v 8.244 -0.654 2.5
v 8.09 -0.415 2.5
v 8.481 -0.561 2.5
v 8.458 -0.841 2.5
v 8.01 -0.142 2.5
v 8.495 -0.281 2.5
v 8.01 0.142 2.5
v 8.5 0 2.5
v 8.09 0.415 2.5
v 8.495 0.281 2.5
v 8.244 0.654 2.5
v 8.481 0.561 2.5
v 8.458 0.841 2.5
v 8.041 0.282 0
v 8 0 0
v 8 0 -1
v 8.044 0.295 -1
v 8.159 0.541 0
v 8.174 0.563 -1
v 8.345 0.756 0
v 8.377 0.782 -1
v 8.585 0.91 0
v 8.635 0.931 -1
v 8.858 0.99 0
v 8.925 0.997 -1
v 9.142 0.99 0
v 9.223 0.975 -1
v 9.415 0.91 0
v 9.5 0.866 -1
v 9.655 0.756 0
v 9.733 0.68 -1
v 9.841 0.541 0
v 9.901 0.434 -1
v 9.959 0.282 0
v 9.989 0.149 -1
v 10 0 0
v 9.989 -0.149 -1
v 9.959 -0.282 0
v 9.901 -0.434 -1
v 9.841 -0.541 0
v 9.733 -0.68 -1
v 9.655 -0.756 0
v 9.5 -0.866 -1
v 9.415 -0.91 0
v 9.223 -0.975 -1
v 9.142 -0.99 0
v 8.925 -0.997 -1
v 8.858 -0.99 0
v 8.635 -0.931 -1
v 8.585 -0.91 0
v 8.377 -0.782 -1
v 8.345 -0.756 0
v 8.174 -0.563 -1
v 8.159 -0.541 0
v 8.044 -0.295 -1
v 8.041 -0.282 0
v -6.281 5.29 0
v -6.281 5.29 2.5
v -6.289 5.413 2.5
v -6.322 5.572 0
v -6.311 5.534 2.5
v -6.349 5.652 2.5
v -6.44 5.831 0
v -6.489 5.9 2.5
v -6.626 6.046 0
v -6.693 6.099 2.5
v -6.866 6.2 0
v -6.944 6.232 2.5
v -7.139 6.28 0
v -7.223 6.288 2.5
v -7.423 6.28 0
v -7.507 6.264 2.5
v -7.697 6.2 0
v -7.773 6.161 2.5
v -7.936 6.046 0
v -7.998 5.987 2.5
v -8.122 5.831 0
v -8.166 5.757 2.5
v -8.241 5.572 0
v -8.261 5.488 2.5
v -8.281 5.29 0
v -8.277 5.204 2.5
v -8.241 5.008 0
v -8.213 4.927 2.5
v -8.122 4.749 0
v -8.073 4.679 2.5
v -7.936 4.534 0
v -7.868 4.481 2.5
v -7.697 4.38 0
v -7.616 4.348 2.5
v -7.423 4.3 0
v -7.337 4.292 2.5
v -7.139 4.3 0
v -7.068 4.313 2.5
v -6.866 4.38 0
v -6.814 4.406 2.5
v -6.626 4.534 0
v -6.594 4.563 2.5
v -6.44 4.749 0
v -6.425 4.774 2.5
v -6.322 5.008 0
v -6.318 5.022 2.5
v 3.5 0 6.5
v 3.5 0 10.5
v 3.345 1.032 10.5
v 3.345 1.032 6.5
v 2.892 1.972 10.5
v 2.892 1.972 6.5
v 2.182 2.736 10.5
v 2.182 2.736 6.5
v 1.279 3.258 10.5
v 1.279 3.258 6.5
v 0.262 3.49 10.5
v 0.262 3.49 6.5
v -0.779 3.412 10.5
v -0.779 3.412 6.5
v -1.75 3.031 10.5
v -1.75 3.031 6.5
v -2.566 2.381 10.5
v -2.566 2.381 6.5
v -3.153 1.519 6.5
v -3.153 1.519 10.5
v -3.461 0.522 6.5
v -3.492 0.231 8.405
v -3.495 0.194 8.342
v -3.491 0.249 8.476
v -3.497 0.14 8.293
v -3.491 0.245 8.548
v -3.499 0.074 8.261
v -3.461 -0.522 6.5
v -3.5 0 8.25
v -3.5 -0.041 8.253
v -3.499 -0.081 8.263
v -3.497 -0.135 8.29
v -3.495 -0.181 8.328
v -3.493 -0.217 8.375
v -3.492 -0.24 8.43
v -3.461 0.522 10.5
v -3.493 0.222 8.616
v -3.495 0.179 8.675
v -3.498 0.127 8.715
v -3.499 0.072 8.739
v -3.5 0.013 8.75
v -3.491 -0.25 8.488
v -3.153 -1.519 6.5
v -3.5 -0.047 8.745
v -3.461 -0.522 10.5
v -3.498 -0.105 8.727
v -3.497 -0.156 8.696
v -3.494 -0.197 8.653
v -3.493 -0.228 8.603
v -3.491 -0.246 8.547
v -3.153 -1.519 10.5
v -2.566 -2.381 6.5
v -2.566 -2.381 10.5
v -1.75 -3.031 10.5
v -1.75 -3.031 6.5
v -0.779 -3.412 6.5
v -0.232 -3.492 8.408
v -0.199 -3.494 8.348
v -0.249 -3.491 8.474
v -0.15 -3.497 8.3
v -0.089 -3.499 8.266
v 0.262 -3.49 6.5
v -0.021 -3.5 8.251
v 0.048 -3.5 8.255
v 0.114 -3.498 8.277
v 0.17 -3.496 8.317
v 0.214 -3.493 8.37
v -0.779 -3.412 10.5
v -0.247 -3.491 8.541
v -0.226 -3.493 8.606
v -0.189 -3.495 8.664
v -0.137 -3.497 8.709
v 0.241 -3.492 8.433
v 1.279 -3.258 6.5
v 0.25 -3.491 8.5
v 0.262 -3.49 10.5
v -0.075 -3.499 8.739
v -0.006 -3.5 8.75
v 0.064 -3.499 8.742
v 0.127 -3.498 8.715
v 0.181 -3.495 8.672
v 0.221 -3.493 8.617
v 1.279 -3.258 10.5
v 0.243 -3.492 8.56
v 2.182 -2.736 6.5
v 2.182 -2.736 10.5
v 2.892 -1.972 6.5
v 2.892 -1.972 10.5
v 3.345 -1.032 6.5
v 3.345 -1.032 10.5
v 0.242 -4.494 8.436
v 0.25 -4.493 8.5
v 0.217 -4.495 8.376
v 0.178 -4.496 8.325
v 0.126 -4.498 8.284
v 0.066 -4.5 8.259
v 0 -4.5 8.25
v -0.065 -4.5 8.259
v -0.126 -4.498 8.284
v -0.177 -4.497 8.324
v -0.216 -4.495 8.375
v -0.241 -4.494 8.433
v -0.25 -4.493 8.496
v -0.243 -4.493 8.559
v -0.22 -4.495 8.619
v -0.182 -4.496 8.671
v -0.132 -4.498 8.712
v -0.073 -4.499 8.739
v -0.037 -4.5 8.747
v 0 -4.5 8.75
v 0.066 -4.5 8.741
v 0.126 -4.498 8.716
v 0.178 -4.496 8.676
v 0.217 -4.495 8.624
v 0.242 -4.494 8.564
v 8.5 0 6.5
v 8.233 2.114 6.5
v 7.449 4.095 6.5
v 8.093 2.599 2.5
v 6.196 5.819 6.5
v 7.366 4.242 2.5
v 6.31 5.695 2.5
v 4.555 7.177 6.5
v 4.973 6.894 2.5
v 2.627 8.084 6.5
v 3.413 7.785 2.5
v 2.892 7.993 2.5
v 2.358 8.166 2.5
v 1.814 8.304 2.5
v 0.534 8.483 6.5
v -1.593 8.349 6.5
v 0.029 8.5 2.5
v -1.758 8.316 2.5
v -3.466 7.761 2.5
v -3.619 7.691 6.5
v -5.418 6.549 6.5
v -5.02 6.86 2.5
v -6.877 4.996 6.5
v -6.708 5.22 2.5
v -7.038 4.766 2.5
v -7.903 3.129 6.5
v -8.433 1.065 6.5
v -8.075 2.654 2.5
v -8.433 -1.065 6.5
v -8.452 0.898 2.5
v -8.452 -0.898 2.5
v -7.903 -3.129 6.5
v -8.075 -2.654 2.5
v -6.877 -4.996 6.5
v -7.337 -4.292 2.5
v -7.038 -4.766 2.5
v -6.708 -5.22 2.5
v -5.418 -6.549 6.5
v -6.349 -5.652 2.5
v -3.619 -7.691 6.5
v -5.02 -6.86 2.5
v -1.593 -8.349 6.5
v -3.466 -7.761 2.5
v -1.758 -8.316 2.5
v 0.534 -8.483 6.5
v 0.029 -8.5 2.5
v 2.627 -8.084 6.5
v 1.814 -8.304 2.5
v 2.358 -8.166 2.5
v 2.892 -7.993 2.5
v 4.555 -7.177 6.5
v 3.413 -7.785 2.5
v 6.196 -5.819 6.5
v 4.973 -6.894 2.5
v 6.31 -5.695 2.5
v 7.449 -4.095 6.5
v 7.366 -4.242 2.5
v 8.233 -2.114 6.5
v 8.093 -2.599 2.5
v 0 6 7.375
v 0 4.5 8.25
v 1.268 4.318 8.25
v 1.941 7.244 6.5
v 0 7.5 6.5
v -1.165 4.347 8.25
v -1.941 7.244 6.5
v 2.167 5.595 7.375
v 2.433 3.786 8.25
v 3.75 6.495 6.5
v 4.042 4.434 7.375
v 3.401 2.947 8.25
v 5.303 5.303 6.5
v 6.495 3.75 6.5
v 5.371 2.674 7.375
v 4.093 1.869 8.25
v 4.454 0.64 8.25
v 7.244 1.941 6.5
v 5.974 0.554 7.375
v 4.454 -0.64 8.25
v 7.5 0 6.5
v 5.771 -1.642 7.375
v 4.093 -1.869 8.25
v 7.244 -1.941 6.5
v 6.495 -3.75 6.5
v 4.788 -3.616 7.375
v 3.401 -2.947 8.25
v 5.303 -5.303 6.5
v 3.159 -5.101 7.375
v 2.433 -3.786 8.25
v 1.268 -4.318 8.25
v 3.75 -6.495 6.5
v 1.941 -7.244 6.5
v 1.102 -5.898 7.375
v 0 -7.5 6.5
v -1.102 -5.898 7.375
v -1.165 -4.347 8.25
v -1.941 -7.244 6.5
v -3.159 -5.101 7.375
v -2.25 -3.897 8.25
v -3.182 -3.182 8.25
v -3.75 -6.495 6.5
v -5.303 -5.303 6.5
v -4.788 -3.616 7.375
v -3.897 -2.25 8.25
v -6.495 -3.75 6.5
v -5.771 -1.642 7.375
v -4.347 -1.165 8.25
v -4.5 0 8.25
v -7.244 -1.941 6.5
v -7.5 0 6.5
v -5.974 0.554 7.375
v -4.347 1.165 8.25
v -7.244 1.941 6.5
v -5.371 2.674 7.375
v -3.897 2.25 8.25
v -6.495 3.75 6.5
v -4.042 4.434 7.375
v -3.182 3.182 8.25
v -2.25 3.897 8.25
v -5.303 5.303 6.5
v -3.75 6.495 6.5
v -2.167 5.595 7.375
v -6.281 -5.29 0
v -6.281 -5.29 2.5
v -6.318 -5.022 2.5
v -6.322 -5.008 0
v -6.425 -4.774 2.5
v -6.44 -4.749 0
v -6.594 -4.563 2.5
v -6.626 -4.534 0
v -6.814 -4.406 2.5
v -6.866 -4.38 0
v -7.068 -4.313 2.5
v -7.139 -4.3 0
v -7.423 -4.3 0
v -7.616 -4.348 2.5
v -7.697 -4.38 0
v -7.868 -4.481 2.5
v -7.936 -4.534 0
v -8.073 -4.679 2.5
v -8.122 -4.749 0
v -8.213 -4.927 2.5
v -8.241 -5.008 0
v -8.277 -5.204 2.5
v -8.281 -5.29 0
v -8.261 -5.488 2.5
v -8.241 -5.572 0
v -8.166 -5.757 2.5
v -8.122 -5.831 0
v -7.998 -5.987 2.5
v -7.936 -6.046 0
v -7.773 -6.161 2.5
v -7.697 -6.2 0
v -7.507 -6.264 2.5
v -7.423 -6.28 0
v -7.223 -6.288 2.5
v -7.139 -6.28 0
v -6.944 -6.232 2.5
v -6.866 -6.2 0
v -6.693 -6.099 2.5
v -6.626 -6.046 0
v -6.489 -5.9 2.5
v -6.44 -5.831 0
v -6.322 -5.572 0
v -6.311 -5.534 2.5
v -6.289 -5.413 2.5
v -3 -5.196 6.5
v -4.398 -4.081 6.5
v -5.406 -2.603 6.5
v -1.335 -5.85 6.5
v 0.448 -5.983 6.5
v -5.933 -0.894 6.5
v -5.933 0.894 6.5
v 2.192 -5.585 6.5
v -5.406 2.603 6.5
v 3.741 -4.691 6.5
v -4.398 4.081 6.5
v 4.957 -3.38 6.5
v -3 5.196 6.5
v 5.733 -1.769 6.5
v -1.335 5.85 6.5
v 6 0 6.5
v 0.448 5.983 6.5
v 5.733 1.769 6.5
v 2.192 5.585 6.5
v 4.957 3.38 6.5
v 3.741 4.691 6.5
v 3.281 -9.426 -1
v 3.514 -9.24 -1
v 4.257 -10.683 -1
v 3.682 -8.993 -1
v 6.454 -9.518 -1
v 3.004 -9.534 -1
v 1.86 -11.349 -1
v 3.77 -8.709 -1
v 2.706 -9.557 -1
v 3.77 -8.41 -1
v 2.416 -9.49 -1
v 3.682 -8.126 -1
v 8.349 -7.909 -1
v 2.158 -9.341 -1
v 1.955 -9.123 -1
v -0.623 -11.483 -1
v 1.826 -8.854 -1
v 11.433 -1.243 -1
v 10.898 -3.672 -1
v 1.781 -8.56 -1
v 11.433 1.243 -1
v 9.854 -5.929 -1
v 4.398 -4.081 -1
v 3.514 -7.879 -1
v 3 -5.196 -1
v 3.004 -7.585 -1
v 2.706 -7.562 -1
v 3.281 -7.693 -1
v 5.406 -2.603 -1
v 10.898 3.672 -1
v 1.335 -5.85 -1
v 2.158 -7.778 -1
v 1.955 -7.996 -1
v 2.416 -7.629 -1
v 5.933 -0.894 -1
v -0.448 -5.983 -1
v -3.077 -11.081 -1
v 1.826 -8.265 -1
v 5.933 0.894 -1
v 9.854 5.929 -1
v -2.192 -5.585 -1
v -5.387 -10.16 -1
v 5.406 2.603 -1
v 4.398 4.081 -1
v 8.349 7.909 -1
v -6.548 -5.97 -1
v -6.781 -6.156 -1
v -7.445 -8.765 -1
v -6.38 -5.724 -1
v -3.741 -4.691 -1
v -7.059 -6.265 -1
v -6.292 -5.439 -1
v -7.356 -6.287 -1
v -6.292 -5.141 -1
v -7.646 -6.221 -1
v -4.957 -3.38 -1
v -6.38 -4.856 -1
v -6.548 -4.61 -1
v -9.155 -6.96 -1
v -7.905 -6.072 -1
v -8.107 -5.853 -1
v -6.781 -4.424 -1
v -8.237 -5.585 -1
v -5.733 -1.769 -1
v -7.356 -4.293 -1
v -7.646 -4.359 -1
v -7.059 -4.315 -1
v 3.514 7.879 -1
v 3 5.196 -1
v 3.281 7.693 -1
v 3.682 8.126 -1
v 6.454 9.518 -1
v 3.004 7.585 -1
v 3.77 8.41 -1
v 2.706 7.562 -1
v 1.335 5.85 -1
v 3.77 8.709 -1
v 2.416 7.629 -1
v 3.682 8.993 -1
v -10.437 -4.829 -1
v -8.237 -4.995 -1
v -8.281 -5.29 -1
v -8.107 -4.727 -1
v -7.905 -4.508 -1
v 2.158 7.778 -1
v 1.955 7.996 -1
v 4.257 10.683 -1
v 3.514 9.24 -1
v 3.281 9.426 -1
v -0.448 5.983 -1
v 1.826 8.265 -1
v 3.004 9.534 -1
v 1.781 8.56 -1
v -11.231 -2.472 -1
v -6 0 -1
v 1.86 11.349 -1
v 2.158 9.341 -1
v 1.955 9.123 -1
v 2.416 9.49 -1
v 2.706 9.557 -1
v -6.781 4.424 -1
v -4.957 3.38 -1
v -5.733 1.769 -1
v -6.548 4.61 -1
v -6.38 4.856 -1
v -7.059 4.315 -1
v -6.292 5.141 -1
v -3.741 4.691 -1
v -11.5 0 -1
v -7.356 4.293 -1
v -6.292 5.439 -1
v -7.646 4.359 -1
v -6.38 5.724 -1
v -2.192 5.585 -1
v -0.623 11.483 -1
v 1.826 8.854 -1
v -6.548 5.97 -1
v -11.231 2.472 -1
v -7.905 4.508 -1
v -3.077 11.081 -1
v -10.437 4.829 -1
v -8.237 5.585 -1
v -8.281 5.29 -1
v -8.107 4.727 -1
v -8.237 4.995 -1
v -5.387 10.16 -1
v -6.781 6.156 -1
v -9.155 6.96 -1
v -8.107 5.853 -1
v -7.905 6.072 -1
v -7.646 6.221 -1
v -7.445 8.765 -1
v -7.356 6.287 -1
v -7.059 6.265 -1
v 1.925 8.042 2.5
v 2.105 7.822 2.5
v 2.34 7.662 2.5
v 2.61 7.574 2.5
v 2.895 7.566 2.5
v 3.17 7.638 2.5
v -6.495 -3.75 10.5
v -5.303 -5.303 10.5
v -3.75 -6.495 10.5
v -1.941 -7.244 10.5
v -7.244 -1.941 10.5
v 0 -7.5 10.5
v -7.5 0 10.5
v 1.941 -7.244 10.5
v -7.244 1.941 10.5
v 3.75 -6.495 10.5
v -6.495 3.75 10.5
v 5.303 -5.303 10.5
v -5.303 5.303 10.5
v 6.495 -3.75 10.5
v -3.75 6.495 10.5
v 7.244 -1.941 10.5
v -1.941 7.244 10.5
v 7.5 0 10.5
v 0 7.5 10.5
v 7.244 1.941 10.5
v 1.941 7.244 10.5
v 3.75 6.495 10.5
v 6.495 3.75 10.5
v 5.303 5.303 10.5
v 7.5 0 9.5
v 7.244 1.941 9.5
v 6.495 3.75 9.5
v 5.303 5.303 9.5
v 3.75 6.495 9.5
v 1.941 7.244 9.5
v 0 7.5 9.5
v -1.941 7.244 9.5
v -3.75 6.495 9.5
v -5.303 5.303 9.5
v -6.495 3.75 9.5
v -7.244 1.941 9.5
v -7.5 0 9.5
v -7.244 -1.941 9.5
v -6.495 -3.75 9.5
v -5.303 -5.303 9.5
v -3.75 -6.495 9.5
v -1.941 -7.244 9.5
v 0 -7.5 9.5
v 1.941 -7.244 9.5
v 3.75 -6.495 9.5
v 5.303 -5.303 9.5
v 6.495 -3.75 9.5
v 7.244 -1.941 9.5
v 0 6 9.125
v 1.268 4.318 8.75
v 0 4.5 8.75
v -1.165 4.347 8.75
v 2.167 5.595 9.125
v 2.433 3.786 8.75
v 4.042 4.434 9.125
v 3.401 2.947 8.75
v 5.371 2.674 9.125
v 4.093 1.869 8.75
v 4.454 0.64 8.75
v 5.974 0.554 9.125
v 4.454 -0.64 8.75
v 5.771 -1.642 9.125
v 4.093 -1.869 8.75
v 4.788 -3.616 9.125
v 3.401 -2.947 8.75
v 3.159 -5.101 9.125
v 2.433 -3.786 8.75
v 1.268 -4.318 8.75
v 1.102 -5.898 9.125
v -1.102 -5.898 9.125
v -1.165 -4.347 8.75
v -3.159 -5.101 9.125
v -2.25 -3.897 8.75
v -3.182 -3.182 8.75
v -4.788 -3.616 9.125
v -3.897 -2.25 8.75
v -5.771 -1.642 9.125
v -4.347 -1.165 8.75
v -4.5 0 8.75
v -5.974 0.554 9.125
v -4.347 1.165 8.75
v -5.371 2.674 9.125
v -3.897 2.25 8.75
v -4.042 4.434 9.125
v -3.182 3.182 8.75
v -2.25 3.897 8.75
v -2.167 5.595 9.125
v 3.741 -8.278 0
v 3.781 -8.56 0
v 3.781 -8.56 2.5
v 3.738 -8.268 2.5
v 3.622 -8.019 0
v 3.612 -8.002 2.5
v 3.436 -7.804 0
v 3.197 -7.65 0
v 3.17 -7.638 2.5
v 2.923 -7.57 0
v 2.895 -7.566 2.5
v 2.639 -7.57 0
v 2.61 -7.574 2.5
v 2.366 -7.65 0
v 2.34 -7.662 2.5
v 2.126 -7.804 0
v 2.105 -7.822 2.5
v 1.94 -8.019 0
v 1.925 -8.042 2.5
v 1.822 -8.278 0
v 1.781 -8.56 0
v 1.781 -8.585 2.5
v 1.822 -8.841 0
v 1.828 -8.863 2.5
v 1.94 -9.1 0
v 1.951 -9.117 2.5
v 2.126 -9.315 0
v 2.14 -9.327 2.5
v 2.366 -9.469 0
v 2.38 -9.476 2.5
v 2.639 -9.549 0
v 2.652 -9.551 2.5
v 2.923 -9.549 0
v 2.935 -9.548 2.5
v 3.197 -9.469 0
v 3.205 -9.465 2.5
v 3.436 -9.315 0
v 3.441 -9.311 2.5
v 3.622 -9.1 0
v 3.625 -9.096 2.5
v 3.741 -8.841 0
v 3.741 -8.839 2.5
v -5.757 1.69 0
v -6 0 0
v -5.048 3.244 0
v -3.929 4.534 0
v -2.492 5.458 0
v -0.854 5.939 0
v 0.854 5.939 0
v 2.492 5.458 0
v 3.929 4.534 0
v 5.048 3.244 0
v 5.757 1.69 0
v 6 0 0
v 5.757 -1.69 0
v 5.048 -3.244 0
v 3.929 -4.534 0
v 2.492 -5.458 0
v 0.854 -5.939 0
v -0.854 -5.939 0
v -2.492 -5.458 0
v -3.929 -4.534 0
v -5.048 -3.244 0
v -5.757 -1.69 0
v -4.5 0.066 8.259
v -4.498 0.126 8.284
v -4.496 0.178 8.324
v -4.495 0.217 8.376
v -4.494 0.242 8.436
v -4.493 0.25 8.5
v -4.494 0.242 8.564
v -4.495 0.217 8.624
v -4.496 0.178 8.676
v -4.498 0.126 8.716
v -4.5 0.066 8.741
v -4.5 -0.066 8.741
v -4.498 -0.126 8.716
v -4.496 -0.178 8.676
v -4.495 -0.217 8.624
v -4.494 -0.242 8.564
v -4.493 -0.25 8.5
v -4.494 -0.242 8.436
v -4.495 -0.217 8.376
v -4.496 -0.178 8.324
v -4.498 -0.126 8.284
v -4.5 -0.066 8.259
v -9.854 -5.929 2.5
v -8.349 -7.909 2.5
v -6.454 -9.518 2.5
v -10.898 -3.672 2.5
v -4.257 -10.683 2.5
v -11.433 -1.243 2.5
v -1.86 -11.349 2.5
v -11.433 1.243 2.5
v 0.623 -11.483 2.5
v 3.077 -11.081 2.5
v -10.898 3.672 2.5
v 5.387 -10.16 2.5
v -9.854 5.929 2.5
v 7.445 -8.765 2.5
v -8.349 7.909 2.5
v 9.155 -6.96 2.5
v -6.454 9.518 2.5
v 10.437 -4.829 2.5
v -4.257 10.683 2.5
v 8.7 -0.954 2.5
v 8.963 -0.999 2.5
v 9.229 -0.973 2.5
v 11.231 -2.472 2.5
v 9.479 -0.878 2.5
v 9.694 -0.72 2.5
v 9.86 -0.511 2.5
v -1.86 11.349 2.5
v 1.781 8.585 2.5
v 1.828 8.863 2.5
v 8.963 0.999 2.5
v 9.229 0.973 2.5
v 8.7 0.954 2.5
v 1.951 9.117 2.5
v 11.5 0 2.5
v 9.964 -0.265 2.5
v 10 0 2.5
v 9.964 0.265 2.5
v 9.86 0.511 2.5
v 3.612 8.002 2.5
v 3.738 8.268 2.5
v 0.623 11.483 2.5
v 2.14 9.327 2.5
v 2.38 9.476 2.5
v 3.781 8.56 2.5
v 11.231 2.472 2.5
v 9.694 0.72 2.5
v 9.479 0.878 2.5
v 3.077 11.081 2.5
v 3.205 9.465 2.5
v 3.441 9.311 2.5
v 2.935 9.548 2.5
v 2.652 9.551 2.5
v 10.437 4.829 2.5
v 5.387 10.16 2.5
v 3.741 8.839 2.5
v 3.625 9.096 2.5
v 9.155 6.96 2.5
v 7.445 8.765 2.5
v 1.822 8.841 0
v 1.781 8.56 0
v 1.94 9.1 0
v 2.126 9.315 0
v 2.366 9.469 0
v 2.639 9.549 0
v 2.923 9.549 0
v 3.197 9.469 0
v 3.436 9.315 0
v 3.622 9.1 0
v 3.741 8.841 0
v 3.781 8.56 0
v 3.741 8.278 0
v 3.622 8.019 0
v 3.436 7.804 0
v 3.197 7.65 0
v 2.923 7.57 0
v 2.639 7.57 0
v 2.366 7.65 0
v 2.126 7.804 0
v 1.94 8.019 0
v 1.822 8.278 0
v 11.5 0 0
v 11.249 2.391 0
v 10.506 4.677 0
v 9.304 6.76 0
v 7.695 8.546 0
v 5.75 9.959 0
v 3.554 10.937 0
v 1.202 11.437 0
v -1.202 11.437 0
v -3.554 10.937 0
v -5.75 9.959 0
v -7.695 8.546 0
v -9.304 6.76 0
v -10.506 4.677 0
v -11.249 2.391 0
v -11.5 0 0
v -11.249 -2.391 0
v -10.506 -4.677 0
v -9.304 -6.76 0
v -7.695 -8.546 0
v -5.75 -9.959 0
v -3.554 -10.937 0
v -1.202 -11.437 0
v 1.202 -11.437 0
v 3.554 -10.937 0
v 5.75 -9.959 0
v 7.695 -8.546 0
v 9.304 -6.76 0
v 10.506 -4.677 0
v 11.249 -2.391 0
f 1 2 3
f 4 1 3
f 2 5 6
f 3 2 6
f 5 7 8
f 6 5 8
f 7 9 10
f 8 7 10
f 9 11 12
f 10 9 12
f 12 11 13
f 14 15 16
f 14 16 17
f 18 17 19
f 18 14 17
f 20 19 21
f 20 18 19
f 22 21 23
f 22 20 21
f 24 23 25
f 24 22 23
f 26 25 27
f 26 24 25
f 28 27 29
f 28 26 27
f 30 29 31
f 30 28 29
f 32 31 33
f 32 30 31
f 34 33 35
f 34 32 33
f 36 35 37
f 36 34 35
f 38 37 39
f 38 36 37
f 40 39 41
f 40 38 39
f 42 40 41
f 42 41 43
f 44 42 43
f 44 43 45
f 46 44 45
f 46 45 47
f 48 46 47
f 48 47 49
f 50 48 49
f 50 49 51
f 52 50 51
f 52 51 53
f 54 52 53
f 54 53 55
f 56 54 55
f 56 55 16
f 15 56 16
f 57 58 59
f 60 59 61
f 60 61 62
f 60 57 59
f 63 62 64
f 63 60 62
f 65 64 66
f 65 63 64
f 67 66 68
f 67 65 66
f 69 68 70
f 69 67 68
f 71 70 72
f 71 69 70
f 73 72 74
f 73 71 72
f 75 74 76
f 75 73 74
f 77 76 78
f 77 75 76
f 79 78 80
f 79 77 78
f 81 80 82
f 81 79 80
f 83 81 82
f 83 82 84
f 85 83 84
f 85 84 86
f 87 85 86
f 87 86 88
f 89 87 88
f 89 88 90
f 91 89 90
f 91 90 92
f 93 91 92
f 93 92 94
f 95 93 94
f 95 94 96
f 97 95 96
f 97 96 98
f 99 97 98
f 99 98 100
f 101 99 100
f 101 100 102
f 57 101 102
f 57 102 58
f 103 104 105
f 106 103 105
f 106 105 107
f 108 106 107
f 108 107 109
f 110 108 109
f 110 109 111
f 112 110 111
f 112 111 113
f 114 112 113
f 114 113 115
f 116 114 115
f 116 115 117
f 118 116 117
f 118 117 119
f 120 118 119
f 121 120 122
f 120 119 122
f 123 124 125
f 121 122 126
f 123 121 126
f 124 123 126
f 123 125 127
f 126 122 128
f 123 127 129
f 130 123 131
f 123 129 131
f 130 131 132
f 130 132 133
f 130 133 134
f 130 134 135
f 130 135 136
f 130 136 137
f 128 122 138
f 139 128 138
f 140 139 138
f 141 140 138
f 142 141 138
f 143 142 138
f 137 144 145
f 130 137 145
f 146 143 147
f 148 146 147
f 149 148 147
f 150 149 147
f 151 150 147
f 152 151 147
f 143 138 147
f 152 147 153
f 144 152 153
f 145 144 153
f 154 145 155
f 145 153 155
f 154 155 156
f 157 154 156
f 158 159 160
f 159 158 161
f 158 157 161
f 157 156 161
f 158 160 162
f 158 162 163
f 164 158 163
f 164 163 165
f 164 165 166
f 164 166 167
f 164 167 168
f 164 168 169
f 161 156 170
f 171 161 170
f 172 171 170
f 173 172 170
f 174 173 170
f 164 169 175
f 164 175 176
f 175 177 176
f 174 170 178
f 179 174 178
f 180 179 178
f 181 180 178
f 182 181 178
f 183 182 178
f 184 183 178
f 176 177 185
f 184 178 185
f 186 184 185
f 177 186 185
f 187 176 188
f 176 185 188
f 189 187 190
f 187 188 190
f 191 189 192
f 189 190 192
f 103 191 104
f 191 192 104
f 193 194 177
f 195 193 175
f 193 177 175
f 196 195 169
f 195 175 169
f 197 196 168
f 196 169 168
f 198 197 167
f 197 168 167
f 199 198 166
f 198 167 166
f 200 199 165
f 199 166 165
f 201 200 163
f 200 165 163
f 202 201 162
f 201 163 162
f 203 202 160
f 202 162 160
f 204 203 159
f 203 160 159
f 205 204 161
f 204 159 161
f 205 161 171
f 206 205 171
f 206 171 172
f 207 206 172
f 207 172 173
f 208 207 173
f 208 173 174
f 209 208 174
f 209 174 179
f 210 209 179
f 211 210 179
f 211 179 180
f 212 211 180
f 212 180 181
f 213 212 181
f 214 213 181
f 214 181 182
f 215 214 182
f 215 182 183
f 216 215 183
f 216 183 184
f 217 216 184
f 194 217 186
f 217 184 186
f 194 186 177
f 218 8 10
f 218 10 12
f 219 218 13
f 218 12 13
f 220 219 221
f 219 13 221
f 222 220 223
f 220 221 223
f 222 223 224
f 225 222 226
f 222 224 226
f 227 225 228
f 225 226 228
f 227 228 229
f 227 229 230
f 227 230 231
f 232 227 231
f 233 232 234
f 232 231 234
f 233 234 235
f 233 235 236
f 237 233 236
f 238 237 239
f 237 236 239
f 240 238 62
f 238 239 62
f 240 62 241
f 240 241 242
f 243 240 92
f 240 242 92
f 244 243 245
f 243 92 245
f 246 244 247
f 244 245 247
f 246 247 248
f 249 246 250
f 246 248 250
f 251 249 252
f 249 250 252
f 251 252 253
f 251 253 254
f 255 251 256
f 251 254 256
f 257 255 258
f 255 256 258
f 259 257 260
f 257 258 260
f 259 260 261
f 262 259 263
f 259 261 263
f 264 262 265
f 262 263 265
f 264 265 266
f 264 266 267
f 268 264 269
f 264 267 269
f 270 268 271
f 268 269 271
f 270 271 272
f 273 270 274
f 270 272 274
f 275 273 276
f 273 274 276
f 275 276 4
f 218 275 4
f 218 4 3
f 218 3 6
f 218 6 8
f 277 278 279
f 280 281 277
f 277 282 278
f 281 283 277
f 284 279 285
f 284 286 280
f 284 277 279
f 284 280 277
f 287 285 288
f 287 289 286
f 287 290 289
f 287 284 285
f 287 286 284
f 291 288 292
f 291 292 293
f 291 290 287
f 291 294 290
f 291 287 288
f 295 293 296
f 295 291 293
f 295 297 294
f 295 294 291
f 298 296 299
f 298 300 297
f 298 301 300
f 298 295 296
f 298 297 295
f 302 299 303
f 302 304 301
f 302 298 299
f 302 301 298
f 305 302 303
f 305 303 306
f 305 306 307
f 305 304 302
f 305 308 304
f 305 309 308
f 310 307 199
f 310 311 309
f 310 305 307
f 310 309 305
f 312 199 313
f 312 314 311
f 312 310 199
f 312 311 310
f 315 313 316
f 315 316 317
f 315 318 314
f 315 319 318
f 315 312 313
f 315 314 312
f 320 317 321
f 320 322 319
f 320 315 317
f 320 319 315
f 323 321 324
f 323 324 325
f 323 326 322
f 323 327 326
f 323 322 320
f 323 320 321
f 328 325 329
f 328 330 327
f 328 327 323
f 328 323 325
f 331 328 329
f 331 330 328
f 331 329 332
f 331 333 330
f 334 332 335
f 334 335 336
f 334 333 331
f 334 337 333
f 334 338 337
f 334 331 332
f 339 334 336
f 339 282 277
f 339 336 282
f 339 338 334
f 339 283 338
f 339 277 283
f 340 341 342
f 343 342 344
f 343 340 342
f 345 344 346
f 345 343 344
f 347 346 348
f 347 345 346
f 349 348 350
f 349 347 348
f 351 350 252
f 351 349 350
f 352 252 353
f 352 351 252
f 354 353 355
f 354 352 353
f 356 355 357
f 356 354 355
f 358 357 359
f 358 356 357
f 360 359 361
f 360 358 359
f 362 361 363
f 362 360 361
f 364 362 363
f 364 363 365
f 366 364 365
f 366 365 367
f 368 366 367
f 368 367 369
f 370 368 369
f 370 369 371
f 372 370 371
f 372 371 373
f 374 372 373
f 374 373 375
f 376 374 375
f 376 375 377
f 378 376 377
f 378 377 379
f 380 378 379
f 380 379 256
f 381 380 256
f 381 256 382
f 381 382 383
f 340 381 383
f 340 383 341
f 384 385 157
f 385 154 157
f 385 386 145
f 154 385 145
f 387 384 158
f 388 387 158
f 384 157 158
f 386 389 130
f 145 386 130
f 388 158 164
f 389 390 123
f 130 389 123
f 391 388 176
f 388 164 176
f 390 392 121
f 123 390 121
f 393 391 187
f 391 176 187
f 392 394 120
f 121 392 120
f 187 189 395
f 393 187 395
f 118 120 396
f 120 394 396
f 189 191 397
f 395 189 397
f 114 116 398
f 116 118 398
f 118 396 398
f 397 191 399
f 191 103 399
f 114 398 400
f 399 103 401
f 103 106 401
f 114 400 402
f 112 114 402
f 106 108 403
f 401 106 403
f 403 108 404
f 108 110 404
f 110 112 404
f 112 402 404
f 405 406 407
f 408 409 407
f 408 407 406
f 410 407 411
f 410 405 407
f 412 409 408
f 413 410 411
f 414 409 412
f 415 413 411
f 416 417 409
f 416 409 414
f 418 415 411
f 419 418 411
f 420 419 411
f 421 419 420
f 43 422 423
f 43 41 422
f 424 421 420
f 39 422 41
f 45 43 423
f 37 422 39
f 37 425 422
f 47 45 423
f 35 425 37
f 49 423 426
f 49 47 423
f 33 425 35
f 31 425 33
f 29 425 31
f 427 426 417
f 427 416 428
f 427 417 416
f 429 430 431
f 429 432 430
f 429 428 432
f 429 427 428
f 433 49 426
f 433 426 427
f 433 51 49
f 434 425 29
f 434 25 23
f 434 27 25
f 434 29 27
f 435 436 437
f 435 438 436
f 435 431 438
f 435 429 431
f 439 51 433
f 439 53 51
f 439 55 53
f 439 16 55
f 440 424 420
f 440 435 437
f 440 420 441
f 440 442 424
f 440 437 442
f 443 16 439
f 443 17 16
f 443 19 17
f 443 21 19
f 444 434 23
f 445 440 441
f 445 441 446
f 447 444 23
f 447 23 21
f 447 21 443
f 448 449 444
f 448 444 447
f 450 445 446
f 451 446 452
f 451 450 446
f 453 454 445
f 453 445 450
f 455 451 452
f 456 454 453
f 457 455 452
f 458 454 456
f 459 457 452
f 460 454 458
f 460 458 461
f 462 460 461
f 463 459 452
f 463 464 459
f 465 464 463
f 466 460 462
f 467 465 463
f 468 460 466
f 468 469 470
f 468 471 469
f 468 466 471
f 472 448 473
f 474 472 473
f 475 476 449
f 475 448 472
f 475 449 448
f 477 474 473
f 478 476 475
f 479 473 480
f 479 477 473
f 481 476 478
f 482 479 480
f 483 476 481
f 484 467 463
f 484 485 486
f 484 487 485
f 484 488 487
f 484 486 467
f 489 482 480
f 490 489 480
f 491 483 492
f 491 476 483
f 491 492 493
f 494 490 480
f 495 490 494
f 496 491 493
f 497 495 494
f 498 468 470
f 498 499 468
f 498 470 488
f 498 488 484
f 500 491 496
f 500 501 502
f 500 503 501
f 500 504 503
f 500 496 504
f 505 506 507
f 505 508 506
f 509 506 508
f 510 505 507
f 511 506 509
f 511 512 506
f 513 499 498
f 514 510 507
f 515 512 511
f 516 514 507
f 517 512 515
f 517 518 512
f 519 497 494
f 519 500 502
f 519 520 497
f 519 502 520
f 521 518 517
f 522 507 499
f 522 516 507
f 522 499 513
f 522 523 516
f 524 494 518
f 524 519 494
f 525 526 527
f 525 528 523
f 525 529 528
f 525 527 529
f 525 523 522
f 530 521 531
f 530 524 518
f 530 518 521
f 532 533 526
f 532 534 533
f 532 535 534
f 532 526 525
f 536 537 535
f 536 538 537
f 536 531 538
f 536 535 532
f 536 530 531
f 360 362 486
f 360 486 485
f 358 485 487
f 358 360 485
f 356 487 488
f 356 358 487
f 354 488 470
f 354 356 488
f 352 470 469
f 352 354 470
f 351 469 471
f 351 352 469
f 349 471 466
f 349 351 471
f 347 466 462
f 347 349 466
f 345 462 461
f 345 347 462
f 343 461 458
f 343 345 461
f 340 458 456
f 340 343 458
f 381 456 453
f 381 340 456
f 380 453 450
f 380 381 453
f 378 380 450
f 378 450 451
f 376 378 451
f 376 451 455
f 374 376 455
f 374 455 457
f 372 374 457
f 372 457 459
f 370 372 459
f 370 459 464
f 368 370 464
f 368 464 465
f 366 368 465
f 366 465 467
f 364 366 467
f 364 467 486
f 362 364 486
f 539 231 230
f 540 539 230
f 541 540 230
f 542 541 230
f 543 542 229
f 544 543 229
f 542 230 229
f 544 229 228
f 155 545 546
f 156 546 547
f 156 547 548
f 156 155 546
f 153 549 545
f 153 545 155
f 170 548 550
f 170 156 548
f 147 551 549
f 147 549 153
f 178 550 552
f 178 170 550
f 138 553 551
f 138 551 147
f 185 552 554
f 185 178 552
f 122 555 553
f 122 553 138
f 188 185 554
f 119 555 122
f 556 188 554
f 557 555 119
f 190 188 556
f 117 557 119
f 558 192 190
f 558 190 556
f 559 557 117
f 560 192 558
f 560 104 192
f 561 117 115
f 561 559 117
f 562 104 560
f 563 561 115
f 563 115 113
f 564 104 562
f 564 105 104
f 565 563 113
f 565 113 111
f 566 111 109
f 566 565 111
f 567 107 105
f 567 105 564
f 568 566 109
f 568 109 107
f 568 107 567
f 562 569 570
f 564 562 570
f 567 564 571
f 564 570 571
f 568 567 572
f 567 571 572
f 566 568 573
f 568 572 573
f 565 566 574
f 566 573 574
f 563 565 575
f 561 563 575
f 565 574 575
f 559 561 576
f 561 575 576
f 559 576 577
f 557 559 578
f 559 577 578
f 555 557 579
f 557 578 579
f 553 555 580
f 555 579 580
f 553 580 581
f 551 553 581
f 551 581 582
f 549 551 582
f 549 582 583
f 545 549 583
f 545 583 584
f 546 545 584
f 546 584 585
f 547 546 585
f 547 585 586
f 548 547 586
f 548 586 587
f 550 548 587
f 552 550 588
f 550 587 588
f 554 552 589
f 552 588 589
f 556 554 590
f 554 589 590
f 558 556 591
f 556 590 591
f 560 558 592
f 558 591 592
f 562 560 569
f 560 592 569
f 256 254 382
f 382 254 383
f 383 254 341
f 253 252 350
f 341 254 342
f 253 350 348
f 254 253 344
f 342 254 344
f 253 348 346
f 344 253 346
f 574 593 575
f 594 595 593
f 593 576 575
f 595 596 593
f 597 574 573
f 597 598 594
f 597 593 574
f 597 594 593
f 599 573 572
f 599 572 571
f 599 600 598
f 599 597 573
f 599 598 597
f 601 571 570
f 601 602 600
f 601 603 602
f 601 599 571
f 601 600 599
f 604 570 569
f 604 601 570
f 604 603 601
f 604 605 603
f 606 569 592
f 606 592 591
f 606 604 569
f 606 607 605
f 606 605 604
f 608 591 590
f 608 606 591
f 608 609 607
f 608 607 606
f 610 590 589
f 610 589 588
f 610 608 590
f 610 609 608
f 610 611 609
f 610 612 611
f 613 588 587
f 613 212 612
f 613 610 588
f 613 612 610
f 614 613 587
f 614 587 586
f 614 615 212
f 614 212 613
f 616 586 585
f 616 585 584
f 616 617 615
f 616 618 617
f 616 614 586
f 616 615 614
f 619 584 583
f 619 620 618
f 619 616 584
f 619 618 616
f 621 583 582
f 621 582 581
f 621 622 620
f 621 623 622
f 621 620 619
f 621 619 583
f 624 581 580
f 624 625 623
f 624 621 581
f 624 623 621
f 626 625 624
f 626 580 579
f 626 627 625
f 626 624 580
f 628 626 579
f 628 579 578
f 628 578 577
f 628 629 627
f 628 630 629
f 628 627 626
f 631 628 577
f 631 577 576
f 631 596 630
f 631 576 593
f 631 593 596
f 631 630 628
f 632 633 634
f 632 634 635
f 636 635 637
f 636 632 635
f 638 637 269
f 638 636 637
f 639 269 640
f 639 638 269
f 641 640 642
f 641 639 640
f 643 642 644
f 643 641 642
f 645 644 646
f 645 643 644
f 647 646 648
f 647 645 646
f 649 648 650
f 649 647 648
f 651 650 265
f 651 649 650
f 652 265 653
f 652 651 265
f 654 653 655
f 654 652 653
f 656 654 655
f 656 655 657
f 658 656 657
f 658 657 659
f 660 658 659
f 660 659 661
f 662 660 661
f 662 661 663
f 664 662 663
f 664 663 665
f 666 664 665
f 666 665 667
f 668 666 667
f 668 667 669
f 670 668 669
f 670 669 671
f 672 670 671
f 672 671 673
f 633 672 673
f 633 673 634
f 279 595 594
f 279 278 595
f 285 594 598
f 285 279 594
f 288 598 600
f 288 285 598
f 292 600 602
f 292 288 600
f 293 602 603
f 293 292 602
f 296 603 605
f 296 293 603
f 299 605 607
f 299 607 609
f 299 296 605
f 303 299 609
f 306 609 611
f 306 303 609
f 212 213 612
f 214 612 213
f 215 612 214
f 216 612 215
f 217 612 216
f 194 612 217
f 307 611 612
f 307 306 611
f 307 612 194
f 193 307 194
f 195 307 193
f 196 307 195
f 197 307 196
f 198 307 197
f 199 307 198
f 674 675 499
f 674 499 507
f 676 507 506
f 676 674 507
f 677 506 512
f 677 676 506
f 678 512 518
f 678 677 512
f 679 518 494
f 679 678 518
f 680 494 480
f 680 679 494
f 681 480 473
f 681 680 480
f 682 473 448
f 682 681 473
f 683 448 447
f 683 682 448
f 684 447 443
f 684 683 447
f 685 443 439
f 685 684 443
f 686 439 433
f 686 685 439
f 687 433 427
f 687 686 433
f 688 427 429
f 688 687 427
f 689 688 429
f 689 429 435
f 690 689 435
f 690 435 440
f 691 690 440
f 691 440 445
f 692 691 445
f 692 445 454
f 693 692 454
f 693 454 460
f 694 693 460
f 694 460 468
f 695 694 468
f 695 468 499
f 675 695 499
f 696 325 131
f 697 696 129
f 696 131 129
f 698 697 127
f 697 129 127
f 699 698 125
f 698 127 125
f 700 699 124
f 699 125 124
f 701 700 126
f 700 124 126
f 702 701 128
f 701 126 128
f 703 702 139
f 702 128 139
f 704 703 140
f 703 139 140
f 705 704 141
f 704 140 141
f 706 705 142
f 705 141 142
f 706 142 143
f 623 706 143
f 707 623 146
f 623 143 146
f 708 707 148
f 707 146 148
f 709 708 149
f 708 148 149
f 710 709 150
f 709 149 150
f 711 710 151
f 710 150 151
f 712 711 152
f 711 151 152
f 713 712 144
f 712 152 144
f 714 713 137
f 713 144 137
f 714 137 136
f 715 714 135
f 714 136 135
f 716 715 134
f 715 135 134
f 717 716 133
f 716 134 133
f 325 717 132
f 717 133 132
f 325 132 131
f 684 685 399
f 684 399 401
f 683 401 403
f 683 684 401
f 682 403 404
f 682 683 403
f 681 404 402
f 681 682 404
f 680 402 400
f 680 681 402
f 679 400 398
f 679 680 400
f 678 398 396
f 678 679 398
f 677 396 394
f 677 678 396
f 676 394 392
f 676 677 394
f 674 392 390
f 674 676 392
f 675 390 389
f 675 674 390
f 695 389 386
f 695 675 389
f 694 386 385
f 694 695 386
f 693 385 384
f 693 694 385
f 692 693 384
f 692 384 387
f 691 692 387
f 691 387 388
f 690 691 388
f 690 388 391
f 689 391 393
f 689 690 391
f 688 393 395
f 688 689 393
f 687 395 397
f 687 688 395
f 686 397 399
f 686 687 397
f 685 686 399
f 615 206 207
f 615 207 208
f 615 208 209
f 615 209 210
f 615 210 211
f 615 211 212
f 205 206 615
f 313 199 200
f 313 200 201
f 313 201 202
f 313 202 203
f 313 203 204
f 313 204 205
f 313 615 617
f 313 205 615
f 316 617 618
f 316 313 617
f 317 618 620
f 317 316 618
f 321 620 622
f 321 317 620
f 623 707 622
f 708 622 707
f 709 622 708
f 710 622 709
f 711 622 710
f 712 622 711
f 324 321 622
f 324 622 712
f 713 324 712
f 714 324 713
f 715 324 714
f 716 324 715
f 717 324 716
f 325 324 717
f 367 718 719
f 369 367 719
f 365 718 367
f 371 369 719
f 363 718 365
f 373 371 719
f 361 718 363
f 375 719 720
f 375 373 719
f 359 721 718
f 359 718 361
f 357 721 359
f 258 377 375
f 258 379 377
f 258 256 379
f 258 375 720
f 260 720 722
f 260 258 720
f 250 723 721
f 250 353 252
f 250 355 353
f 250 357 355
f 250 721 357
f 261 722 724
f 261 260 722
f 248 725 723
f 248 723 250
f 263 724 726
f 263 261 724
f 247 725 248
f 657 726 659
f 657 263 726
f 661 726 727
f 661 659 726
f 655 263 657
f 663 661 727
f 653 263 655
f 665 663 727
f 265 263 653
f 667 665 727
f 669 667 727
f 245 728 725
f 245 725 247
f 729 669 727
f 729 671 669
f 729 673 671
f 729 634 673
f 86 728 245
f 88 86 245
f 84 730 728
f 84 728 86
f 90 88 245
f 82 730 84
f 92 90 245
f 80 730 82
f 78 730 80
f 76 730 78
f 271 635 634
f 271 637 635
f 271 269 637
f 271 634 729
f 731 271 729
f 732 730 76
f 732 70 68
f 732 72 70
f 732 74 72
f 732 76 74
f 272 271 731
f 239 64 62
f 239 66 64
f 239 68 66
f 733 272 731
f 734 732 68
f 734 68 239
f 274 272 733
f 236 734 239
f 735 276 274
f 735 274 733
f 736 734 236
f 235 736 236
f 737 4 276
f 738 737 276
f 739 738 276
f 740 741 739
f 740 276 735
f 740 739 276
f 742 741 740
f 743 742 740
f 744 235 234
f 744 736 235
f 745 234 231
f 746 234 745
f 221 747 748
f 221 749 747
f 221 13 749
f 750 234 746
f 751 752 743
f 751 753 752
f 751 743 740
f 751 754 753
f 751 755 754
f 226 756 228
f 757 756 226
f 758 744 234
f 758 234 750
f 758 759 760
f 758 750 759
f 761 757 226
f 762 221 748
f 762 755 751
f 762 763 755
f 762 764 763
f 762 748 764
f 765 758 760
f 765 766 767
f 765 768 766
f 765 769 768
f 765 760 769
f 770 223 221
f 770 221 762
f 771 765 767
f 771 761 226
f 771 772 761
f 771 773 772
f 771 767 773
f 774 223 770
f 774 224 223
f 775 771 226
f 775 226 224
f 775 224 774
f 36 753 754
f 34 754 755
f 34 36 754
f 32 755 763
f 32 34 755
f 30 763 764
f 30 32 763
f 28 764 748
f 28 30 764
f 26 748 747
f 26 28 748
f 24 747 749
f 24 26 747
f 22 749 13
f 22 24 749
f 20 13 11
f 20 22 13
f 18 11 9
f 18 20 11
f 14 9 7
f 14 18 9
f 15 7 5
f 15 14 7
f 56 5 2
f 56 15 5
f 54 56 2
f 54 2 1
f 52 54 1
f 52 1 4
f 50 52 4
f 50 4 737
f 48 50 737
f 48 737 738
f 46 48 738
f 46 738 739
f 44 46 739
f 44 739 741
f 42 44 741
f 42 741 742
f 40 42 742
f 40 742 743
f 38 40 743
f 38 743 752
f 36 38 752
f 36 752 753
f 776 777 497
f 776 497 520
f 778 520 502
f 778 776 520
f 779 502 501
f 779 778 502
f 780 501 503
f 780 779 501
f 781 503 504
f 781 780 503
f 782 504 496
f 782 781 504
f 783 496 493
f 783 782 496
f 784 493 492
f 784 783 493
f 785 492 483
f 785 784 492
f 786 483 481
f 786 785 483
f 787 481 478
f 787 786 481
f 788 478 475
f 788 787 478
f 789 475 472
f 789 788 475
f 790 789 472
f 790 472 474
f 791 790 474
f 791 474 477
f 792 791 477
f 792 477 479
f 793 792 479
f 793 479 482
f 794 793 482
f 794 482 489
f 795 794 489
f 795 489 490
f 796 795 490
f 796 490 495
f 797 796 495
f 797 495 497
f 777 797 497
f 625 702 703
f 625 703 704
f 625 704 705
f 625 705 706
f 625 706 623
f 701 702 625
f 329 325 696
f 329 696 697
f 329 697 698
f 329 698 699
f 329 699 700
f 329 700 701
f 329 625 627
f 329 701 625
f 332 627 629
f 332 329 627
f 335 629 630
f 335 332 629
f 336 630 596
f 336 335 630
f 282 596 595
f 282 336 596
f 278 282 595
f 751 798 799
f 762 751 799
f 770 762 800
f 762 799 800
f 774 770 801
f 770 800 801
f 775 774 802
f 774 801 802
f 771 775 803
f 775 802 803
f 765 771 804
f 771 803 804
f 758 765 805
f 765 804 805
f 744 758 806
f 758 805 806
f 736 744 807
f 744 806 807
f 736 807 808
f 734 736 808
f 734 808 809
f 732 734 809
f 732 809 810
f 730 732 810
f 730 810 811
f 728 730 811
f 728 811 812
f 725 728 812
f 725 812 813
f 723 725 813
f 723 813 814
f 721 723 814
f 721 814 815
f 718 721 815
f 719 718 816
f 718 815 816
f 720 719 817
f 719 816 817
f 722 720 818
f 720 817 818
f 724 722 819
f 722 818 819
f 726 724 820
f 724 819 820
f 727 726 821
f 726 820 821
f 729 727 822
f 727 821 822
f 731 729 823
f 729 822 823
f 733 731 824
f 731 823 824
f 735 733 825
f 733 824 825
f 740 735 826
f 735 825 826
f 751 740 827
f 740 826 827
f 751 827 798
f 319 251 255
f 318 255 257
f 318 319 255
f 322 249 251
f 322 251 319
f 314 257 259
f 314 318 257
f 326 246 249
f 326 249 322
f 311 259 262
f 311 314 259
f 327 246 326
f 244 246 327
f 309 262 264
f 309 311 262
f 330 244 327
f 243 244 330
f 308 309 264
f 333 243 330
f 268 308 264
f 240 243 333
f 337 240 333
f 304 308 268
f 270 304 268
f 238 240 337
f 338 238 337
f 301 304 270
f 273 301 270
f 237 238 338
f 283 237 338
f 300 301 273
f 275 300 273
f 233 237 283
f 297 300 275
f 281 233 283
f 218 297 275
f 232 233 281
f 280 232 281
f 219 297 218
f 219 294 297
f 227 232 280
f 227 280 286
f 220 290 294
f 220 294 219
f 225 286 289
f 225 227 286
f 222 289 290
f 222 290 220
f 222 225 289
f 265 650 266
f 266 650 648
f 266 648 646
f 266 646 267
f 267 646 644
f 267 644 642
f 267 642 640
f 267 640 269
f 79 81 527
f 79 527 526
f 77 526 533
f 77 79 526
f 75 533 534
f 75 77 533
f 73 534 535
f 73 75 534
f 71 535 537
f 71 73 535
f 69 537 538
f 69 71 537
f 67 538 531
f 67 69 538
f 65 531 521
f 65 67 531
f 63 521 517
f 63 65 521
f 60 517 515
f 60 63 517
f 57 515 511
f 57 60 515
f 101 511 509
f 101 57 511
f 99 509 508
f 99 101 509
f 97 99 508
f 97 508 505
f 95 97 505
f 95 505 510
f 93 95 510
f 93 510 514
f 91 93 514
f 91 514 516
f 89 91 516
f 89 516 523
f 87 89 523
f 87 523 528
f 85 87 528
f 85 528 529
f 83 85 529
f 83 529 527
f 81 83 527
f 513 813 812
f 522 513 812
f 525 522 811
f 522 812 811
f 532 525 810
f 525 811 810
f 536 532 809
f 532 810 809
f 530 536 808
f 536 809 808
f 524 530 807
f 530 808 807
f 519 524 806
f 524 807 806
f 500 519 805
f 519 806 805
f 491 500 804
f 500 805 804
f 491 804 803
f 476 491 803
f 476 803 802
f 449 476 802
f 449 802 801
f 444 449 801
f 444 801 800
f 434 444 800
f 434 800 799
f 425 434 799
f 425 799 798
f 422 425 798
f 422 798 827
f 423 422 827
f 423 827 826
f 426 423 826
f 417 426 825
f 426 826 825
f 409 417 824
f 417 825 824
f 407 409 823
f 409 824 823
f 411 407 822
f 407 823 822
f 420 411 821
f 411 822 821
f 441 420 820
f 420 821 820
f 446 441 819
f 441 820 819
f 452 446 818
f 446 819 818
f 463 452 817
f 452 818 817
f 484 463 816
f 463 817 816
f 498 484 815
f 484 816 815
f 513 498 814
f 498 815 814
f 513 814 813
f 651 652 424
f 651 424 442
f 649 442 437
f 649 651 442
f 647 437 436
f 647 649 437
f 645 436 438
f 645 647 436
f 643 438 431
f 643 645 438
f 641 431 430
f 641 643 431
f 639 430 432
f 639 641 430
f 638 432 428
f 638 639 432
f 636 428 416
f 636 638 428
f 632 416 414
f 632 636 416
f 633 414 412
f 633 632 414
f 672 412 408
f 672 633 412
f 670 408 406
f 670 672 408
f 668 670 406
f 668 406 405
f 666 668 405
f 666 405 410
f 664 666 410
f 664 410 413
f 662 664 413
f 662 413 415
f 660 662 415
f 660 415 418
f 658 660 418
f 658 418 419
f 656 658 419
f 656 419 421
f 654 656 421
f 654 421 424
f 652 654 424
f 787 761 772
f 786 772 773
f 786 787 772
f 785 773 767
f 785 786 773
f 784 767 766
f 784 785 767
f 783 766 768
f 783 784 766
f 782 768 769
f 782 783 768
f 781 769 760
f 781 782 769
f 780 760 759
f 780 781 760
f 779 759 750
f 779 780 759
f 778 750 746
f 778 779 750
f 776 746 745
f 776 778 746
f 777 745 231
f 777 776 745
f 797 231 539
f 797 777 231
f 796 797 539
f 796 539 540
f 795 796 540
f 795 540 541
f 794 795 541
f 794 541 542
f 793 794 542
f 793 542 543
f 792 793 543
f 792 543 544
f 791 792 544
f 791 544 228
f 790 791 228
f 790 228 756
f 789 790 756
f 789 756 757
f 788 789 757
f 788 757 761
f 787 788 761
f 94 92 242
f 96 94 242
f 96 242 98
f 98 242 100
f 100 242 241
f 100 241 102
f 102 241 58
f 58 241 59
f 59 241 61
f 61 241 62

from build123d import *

# Parameters (mm, degrees)
SKETCH_1_R          = 11.5
SKETCH_1_R_2        = 1
SKETCH_1_R_3        = 6
EXTRUDE_1_DEPTH     = 2.5
SKETCH_2_R          = 8.5
SKETCH_2_R_2        = 6
EXTRUDE_2_DEPTH     = 4
SKETCH_3_R          = 7.5
EXTRUDE_3_DEPTH     = 4
SKETCH_4_R          = 3.5
CUT_EXTRUDE_1_DEPTH = 4
SKETCH_6_R          = 0.25
CUT_EXTRUDE_2_DEPTH = 14
SKETCH_7_R          = 11.5
SKETCH_7_R_2        = 1
SKETCH_7_R_3        = 6
EXTRUDE_4_DEPTH     = 1
SKETCH_9_R          = 0.25
CUT_EXTRUDE_8_DEPTH = 12.2


with BuildPart() as part:
    # 草图1 → 凸台-拉伸1 (new body)
    with BuildSketch(Plane.XY):
        Circle(SKETCH_1_R)
        with Locations((9, 0)):
            Circle(SKETCH_1_R_2, mode=Mode.SUBTRACT)
        with Locations((2.781152949, -8.559508647)):
            Circle(SKETCH_1_R_2, mode=Mode.SUBTRACT)
        with Locations((-7.281152949, -5.290067271)):
            Circle(SKETCH_1_R_2, mode=Mode.SUBTRACT)
        with Locations((-7.281152949, 5.290067271)):
            Circle(SKETCH_1_R_2, mode=Mode.SUBTRACT)
        with Locations((2.781152949, 8.559508647)):
            Circle(SKETCH_1_R_2, mode=Mode.SUBTRACT)
        Circle(SKETCH_1_R_3, mode=Mode.SUBTRACT)
    extrude(amount=EXTRUDE_1_DEPTH)

    # 草图2 → 凸台-拉伸2 (add)
    with BuildSketch(Plane.XY.offset(2.5)):
        Circle(SKETCH_2_R)
        Circle(SKETCH_2_R_2, mode=Mode.SUBTRACT)
    extrude(amount=EXTRUDE_2_DEPTH)

    # 草图3 → 凸台-拉伸3 (add)
    with BuildSketch(Plane.XY.offset(6.5)):
        Circle(SKETCH_3_R)
    extrude(amount=EXTRUDE_3_DEPTH)

    # 草图4 → 切除-拉伸1 (cut)
    with BuildSketch(Plane.XY.offset(10.5)):
        Circle(SKETCH_4_R)
    extrude(amount=-CUT_EXTRUDE_1_DEPTH, mode=Mode.SUBTRACT)

    # 草图5 → 切除-旋转2 (revolve, cut)
    with BuildSketch(Plane(origin=(0, 0, 0), x_dir=(0, 0, -1), z_dir=(1, 0, 0))):
        Polygon((-7.5, 7.5), (-9.5, 7.5), (-8.75, 4.5), (-8.25, 4.5), (-6.5, 7.5), align=None)
    revolve(axis=Axis((0, 0, 10.5), (0, 0, -1)), mode=Mode.SUBTRACT)

    # 草图6 → 切除-拉伸2 (cut)
    with BuildSketch(Plane(origin=(0, 0, 0), x_dir=(1, 0, 0), z_dir=(0, 1, 0))):
        with Locations((0, -8.5)):
            Circle(SKETCH_6_R)
    extrude(amount=-CUT_EXTRUDE_2_DEPTH, mode=Mode.SUBTRACT)

    # 草图7 → 凸台-拉伸4 (add)
    with BuildSketch(Plane(origin=(0, 0, 0), x_dir=(-1, 0, 0), z_dir=(0, 0, -1))):
        Circle(SKETCH_7_R)
        with Locations((-2.781152949, -8.559508647)):
            Circle(SKETCH_7_R_2, mode=Mode.SUBTRACT)
        with Locations((7.281152949, -5.290067271)):
            Circle(SKETCH_7_R_2, mode=Mode.SUBTRACT)
        with Locations((7.281152949, 5.290067271)):
            Circle(SKETCH_7_R_2, mode=Mode.SUBTRACT)
        with Locations((-2.781152949, 8.559508647)):
            Circle(SKETCH_7_R_2, mode=Mode.SUBTRACT)
        with Locations((-9, 0)):
            Circle(SKETCH_7_R_2, mode=Mode.SUBTRACT)
        Circle(SKETCH_7_R_3, mode=Mode.SUBTRACT)
    extrude(amount=EXTRUDE_4_DEPTH)

    # 草图9 → 切除-拉伸8 (cut)
    with BuildSketch(Plane(origin=(0, 0, 0), x_dir=(0, 0, -1), z_dir=(1, 0, 0))):
        with Locations((-8.5, 0)):
            Circle(SKETCH_9_R)
    extrude(amount=-CUT_EXTRUDE_8_DEPTH, mode=Mode.SUBTRACT)


solid = part.part
